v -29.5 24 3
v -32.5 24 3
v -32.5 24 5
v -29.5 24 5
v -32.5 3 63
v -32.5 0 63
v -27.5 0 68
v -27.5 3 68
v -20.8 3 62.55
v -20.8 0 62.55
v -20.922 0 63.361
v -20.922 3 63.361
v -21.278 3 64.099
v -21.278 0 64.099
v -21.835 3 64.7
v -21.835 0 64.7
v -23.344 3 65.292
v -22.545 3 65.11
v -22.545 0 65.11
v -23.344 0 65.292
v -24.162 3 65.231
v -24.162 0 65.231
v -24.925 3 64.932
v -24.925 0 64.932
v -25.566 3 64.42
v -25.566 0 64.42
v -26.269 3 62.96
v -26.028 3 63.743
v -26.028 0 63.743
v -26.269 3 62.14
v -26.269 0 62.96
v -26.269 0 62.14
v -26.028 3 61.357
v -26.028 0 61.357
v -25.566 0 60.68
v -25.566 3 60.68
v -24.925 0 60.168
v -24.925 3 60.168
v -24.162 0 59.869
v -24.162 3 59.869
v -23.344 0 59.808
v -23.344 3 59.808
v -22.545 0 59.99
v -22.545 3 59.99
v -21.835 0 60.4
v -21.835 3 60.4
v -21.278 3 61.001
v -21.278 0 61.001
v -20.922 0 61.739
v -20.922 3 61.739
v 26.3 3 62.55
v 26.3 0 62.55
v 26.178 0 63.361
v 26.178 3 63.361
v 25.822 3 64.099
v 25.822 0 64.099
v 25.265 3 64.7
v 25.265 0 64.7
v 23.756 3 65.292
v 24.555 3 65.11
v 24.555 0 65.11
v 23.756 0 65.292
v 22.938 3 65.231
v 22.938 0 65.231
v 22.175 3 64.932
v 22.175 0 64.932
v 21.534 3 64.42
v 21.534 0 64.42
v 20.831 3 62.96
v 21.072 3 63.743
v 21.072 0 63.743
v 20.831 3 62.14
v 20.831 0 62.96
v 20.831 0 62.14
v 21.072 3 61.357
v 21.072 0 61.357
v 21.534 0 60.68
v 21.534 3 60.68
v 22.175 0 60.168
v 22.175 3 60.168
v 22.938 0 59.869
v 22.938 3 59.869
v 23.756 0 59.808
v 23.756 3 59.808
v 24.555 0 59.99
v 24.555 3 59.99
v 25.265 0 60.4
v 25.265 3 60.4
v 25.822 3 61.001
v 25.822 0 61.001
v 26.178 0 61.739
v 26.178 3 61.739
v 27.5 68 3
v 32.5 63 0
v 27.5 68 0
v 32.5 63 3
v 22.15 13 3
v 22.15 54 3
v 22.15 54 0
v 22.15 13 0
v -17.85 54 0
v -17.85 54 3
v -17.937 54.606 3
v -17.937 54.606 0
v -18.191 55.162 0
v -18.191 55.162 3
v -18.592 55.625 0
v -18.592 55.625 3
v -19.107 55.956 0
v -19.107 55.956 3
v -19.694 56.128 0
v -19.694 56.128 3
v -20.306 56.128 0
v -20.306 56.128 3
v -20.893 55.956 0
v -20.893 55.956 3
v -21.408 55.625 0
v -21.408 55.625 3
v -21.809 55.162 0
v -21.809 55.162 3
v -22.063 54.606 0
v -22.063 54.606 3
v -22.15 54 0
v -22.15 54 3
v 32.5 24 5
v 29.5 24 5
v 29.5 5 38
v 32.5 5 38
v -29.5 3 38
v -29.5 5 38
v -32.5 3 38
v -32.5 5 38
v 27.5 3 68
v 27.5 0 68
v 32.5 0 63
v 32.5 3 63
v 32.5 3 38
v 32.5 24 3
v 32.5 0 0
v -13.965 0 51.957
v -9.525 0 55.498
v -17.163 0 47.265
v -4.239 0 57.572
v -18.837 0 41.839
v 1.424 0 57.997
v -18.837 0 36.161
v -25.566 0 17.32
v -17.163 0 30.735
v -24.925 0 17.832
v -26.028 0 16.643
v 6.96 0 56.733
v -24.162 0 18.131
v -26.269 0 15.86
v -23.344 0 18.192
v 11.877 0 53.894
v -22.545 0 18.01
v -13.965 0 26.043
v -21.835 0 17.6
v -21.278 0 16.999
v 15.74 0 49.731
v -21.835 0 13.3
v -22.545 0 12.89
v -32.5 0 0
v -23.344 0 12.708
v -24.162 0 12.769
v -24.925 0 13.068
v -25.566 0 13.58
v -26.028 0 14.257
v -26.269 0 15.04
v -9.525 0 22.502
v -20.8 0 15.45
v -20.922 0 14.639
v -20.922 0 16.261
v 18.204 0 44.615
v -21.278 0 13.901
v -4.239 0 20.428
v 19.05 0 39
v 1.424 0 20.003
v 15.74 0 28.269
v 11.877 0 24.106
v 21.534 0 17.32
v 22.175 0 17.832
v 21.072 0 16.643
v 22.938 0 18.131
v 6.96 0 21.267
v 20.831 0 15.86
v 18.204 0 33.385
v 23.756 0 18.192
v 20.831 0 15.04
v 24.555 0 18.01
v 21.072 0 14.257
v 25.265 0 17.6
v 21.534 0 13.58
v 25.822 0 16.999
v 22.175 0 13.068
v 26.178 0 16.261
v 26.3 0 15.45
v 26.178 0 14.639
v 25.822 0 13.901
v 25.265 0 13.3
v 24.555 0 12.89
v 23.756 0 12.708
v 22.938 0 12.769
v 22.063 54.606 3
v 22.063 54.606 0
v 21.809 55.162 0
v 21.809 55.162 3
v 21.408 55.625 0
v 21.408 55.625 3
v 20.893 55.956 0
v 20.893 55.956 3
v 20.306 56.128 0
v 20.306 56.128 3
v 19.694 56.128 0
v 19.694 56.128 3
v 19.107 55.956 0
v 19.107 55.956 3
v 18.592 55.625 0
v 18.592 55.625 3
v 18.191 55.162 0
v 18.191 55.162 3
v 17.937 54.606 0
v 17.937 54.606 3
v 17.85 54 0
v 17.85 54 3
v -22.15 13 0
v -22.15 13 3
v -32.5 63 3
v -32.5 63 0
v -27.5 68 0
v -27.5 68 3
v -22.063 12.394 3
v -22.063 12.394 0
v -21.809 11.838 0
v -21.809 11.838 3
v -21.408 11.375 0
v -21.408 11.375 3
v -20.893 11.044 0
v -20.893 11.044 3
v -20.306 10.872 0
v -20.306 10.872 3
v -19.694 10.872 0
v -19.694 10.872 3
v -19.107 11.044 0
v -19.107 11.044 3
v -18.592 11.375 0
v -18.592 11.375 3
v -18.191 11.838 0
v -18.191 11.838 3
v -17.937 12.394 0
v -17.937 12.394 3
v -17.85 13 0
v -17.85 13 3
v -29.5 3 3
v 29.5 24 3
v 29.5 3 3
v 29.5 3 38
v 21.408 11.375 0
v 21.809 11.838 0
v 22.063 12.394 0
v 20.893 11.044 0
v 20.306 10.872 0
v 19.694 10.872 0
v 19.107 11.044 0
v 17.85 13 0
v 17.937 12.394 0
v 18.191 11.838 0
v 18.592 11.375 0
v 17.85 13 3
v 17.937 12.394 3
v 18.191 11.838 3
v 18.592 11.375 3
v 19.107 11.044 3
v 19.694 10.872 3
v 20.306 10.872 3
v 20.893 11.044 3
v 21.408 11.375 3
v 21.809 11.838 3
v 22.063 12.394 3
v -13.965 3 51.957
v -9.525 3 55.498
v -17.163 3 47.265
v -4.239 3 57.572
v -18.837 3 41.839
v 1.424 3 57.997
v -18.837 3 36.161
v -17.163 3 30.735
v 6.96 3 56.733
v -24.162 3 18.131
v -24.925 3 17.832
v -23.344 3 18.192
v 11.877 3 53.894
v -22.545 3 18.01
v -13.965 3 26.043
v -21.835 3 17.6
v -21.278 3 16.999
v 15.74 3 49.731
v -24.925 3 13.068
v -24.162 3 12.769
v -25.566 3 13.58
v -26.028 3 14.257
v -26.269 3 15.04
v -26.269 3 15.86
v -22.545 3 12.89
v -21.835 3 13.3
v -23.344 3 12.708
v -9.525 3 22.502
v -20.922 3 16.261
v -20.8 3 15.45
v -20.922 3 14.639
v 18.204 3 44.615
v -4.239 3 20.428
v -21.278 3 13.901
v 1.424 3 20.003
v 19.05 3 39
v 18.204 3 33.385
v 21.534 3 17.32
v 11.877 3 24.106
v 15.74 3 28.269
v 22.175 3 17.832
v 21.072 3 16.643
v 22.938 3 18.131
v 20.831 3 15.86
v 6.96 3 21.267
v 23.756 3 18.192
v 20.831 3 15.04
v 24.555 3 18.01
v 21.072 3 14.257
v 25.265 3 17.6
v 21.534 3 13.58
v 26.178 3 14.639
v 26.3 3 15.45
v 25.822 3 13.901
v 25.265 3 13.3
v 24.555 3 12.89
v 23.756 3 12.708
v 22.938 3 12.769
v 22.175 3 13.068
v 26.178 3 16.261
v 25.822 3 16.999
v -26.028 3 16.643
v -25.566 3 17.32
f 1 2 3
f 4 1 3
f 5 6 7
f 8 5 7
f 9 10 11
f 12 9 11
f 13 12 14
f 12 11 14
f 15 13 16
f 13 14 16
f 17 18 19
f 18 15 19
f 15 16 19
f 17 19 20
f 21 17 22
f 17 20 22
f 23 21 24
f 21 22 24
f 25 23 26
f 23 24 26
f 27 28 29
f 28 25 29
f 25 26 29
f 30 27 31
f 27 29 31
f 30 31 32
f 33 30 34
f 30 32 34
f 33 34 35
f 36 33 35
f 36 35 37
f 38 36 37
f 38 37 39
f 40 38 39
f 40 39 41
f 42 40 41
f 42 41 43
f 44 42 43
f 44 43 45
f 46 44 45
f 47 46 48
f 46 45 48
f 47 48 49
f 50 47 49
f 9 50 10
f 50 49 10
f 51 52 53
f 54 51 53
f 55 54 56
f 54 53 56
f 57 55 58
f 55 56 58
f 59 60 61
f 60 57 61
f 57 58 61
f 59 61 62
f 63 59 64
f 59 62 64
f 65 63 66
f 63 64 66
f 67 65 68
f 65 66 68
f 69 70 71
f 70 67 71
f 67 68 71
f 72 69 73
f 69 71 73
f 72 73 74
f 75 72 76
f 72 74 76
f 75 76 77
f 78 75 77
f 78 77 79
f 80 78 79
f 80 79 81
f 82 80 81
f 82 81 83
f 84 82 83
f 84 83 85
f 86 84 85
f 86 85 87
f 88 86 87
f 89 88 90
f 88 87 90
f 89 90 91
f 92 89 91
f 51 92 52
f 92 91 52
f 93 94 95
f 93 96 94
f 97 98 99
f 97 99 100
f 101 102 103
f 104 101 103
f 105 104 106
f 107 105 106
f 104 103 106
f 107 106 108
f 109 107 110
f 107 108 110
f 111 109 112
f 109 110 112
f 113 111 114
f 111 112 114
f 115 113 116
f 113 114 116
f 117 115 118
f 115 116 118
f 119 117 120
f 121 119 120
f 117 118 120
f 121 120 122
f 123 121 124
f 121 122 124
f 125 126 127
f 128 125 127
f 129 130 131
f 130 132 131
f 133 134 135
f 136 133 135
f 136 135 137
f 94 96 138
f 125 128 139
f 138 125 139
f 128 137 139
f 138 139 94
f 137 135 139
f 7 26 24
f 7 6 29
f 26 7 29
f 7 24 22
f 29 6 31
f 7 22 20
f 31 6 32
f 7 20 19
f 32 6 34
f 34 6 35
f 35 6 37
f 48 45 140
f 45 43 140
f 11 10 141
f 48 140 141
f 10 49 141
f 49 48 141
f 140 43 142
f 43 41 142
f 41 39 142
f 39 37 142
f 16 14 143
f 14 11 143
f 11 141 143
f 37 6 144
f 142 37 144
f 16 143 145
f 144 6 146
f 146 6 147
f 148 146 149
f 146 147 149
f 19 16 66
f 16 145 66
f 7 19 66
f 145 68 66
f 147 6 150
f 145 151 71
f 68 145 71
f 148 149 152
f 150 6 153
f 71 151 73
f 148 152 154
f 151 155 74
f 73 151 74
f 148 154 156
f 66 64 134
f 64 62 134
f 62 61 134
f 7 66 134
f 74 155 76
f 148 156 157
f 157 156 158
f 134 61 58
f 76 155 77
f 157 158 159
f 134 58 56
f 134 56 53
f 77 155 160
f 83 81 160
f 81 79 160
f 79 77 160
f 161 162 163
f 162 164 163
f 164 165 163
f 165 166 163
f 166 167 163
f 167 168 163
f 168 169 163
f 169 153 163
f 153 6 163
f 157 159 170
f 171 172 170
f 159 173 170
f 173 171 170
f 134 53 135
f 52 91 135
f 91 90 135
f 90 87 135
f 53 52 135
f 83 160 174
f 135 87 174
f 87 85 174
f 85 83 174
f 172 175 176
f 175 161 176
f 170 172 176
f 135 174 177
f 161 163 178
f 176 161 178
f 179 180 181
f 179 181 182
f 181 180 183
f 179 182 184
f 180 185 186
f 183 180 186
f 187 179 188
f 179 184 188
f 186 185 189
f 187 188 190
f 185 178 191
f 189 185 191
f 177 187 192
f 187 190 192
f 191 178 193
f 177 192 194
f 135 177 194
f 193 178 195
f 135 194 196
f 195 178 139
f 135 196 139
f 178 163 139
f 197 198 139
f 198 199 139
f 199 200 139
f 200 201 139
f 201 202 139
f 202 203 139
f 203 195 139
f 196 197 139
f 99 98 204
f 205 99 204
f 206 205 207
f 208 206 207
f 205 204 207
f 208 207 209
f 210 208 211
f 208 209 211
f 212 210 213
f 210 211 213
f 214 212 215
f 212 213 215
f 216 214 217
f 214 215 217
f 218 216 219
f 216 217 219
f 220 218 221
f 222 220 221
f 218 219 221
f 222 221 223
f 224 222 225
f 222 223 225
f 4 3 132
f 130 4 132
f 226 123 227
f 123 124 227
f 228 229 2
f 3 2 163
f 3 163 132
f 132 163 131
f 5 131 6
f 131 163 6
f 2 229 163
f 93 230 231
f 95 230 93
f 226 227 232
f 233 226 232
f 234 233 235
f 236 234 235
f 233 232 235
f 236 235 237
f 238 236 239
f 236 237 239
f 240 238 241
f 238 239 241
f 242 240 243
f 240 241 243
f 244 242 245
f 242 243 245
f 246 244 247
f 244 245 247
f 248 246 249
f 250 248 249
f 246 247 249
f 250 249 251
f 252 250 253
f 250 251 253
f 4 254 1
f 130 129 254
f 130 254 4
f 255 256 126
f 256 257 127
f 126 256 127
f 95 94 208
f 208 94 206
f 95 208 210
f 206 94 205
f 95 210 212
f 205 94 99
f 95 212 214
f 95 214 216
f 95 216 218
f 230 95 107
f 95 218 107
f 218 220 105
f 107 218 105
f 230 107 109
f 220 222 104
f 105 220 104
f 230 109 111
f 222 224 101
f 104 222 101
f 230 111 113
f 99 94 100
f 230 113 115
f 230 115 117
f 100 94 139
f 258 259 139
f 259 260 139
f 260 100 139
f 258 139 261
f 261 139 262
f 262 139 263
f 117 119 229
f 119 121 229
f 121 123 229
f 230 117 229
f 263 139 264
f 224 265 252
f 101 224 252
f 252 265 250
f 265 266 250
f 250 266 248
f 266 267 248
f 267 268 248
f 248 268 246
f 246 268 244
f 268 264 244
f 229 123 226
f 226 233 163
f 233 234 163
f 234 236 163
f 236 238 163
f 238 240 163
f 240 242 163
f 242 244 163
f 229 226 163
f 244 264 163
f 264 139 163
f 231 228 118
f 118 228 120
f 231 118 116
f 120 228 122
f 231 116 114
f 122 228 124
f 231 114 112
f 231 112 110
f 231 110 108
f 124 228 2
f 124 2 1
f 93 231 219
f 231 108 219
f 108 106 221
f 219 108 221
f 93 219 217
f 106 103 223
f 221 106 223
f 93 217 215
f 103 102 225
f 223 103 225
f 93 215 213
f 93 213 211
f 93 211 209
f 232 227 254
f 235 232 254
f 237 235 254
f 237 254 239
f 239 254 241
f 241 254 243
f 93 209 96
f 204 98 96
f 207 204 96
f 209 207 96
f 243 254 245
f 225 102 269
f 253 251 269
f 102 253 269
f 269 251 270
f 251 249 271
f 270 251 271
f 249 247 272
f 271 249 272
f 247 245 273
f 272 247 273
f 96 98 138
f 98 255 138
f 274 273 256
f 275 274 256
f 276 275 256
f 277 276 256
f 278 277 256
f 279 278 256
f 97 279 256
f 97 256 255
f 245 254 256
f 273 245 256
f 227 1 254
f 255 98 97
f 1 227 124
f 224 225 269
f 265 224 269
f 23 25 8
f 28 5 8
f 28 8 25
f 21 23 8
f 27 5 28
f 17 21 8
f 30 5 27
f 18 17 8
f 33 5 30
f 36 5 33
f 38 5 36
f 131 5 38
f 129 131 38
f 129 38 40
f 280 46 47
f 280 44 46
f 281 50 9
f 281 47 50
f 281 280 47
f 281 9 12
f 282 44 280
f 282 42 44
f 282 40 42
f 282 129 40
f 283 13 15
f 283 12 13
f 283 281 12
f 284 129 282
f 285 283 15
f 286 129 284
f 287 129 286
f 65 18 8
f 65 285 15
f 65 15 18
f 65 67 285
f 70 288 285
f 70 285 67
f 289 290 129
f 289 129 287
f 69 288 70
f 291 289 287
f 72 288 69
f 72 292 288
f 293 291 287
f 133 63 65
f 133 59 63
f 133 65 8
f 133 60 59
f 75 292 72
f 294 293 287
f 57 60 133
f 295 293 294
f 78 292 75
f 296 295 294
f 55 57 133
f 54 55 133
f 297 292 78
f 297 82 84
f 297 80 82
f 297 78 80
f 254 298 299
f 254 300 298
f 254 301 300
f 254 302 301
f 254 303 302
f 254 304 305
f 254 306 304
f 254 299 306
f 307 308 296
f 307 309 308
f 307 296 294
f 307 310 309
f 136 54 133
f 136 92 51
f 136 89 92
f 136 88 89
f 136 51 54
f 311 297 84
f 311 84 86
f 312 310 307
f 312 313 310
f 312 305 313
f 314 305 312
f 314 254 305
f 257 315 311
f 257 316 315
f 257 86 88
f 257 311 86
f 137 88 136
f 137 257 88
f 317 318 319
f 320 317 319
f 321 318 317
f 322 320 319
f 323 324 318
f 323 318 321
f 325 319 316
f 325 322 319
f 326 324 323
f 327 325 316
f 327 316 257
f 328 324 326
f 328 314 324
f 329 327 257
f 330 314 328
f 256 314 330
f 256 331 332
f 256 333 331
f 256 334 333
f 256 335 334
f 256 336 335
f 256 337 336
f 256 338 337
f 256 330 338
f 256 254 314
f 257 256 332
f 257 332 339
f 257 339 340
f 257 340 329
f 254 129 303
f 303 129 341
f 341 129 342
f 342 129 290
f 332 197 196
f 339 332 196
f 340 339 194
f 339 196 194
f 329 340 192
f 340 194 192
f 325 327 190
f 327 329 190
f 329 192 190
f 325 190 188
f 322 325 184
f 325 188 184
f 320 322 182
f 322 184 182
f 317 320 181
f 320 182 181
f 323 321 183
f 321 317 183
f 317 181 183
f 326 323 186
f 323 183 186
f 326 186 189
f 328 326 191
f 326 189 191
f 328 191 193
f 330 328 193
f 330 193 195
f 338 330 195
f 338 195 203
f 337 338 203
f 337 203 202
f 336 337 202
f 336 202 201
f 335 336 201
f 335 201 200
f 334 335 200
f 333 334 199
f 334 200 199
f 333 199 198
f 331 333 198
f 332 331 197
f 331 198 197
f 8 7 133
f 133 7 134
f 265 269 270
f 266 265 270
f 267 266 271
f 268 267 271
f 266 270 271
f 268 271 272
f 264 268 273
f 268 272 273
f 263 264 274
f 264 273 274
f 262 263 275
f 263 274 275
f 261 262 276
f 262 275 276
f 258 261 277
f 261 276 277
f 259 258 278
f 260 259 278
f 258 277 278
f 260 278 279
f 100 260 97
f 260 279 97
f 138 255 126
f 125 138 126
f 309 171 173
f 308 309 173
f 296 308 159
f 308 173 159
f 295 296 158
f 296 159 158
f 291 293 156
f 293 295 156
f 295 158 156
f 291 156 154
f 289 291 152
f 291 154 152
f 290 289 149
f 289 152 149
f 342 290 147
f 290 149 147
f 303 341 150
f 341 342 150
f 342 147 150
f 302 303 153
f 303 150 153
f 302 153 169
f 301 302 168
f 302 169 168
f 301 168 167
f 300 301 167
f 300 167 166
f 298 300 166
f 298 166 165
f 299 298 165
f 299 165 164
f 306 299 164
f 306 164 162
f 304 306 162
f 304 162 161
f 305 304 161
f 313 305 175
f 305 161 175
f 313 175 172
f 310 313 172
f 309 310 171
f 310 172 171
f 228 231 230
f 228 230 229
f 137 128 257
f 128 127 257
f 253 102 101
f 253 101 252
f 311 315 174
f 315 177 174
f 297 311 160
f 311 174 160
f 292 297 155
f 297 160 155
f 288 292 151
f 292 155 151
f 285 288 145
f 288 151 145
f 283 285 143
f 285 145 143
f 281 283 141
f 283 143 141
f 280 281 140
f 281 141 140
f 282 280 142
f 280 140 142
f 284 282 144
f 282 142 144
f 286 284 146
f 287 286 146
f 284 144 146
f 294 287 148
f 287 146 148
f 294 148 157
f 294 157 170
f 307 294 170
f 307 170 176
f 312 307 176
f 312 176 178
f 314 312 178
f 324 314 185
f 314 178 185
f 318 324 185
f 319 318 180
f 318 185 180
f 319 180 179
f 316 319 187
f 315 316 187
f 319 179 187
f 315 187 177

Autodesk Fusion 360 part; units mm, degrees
sketch "NEMA23 bracket front" plane through (0, 0, 0) normal (0, 1, 0) x (1, 0, 0)
  line L0 (-32.5, -3) -> (-32.5, -63)
  line L1 (-32.5, 0) -> (-32.5, -3)
  line L2 (32.5, 0) -> (-32.5, 0)
  line L3 (32.5, -63) -> (32.5, -3)
  line L4 (-32.5, -3) -> (32.5, -3)
  line L5 (-27.5, -68) -> (27.5, -68)
  line L6 (23.55, -15.45) -> (-23.55, -15.45) construction
  line L7 (32.5, -3) -> (32.5, 0)
  circle A0 centre (-23.55, -62.55) radius 2.75
  line L8 (32.5, 0) -> (32.5, -68) construction
  line L9 (23.55, -62.55) -> (-23.55, -62.55) construction
  circle A1 centre (23.55, -15.45) radius 2.75
  line L10 (32.5, -3) -> (-32.5, -3)
  circle A2 centre (0, -39) radius 19.05
  line L11 (-23.55, -62.55) -> (-23.55, -15.45) construction
  line L12 (23.55, -15.45) -> (23.55, -62.55) construction
  circle A3 centre (-23.55, -15.45) radius 2.75
  circle A4 centre (23.55, -62.55) radius 2.75
  line L13 (-32.5, -63) -> (-27.5, -68)
  line L14 (27.5, -68) -> (32.5, -63)
  dimension "d22" = 38.1
  dimension "d23" = 39
  dimension "d24" = 5.5
  dimension "d27" = 47.1
  dimension "d28" = 47.1
  dimension "d29" = 47.1
  dimension "d30" = 5.5
  dimension "d31" = 5.5
  dimension "d32" = 5.5
  dimension "d33" = 68
  dimension "d34" = 32.5
  dimension "d35" = 65
  dimension "d36" = 3
  dimension "d37" = 65
  dimension "d39" = 5.45
  dimension "d46" = 5
  dimension "d47" = 5
extrude "Extrude1" add sketch "NEMA23 bracket front" along normal blind 68 contours L1 L2 L4 L7 L10 makes body 1
extrude "Extrude2" add sketch "NEMA23 bracket front" along normal blind 3 contours L0 L3 L4 L5 L10 L13 L14 bodies 1
sketch "NEMA23 bracket side" plane through (0, 0, 0) normal (1, 0, 0) x (0, 1, 0)
  line L0 (3, 3) -> (24, 3)
  line L1 (24, 3) -> (24, 5)
  line L2 (24, 5) -> (5, 38)
  line L3 (5, 38) -> (3, 38)
  line L4 (3, 38) -> (3, 3)
  dimension "d52" = 21
  dimension "d53" = 35
  dimension "d54" = 2
  dimension "d55" = 2
  dimension "d56" = 3
  dimension "d57" = 3
extrude "Extrude3" add sketch "NEMA23 bracket side" along normal mid plane 65 bodies 1
extrude "Extrude4" cut sketch "NEMA23 bracket side" along normal mid plane 59 bodies 1
sketch "NEMA23 bracket top" plane through (0, 0, 3) normal (0, 0, 1) x (-1, 0, 0)
  line L0 (32.5, -24) -> (29.5, -24)
  line L1 (29.5, -24) -> (29.5, -3)
  line L2 (29.5, -3) -> (-29.5, -3)
  line L3 (-29.5, -3) -> (-29.5, -24)
  line L4 (-29.5, -24) -> (-32.5, -24)
  line L5 (-32.5, -24) -> (-32.5, -68)
  line L6 (-32.5, -68) -> (32.5, -68)
  line L7 (32.5, -68) -> (32.5, -24)
  line L8 (20, -54) -> (-20, -54) construction
  line L9 (-20, -54) -> (-20, -13) construction
  line L10 (-20, -13) -> (20, -13) construction
  line L11 (20, -13) -> (20, -54) construction
  line L12 (32.5, -68) -> (27.5, -68)
  line L13 (32.5, -68) -> (32.5, -63)
  line L14 (27.5, -68) -> (32.5, -63)
  line L15 (-32.5, -68) -> (-27.5, -68)
  line L16 (-32.5, -68) -> (-32.5, -63)
  line L17 (-32.5, -63) -> (-27.5, -68)
  line L18 (22.15, -54) -> (22.15, -13)
  line L19 (17.85, -54) -> (17.85, -13)
  line L20 (-17.85, -54) -> (-17.85, -13)
  line L21 (-22.15, -54) -> (-22.15, -13)
  arc A0 (17.85, -54) -> (22.15, -54) centre (20, -54) ccw
  arc A1 (22.15, -13) -> (17.85, -13) centre (20, -13) ccw
  arc A2 (-17.85, -13) -> (-22.15, -13) centre (-20, -13) ccw
  arc A3 (-22.15, -54) -> (-17.85, -54) centre (-20, -54) ccw
  dimension "d62" = 40
  dimension "d63" = 41
  dimension "d64" = 13
  dimension "d65" = 4.3
  dimension "d66" = 4.3
  dimension "d67" = 4.3
  dimension "d68" = 4.3
  dimension "d69" = 5
  dimension "d70" = 5
  dimension "d71" = 5
  dimension "d72" = 5
extrude "Extrude5" cut sketch "NEMA23 bracket top" against normal blind 5 contours L18 L19 A0 A1 | L20 L21 A2 A3 bodies 1
extrude "Extrude6" cut sketch "NEMA23 bracket top" against normal blind 5 contours L6 L7 L12 L13 L14 | L5 L6 L15 L16 L17 bodies 1
copy_body "Body->Comp1" bodies 1 removing the originals makes body 2 in component "NEMA23 bracket"
component "NEMA23 bracket" placed x (1, 0, 0) y (0, 1, 0) z (0, 0, 1) at (0, 0, 0)
